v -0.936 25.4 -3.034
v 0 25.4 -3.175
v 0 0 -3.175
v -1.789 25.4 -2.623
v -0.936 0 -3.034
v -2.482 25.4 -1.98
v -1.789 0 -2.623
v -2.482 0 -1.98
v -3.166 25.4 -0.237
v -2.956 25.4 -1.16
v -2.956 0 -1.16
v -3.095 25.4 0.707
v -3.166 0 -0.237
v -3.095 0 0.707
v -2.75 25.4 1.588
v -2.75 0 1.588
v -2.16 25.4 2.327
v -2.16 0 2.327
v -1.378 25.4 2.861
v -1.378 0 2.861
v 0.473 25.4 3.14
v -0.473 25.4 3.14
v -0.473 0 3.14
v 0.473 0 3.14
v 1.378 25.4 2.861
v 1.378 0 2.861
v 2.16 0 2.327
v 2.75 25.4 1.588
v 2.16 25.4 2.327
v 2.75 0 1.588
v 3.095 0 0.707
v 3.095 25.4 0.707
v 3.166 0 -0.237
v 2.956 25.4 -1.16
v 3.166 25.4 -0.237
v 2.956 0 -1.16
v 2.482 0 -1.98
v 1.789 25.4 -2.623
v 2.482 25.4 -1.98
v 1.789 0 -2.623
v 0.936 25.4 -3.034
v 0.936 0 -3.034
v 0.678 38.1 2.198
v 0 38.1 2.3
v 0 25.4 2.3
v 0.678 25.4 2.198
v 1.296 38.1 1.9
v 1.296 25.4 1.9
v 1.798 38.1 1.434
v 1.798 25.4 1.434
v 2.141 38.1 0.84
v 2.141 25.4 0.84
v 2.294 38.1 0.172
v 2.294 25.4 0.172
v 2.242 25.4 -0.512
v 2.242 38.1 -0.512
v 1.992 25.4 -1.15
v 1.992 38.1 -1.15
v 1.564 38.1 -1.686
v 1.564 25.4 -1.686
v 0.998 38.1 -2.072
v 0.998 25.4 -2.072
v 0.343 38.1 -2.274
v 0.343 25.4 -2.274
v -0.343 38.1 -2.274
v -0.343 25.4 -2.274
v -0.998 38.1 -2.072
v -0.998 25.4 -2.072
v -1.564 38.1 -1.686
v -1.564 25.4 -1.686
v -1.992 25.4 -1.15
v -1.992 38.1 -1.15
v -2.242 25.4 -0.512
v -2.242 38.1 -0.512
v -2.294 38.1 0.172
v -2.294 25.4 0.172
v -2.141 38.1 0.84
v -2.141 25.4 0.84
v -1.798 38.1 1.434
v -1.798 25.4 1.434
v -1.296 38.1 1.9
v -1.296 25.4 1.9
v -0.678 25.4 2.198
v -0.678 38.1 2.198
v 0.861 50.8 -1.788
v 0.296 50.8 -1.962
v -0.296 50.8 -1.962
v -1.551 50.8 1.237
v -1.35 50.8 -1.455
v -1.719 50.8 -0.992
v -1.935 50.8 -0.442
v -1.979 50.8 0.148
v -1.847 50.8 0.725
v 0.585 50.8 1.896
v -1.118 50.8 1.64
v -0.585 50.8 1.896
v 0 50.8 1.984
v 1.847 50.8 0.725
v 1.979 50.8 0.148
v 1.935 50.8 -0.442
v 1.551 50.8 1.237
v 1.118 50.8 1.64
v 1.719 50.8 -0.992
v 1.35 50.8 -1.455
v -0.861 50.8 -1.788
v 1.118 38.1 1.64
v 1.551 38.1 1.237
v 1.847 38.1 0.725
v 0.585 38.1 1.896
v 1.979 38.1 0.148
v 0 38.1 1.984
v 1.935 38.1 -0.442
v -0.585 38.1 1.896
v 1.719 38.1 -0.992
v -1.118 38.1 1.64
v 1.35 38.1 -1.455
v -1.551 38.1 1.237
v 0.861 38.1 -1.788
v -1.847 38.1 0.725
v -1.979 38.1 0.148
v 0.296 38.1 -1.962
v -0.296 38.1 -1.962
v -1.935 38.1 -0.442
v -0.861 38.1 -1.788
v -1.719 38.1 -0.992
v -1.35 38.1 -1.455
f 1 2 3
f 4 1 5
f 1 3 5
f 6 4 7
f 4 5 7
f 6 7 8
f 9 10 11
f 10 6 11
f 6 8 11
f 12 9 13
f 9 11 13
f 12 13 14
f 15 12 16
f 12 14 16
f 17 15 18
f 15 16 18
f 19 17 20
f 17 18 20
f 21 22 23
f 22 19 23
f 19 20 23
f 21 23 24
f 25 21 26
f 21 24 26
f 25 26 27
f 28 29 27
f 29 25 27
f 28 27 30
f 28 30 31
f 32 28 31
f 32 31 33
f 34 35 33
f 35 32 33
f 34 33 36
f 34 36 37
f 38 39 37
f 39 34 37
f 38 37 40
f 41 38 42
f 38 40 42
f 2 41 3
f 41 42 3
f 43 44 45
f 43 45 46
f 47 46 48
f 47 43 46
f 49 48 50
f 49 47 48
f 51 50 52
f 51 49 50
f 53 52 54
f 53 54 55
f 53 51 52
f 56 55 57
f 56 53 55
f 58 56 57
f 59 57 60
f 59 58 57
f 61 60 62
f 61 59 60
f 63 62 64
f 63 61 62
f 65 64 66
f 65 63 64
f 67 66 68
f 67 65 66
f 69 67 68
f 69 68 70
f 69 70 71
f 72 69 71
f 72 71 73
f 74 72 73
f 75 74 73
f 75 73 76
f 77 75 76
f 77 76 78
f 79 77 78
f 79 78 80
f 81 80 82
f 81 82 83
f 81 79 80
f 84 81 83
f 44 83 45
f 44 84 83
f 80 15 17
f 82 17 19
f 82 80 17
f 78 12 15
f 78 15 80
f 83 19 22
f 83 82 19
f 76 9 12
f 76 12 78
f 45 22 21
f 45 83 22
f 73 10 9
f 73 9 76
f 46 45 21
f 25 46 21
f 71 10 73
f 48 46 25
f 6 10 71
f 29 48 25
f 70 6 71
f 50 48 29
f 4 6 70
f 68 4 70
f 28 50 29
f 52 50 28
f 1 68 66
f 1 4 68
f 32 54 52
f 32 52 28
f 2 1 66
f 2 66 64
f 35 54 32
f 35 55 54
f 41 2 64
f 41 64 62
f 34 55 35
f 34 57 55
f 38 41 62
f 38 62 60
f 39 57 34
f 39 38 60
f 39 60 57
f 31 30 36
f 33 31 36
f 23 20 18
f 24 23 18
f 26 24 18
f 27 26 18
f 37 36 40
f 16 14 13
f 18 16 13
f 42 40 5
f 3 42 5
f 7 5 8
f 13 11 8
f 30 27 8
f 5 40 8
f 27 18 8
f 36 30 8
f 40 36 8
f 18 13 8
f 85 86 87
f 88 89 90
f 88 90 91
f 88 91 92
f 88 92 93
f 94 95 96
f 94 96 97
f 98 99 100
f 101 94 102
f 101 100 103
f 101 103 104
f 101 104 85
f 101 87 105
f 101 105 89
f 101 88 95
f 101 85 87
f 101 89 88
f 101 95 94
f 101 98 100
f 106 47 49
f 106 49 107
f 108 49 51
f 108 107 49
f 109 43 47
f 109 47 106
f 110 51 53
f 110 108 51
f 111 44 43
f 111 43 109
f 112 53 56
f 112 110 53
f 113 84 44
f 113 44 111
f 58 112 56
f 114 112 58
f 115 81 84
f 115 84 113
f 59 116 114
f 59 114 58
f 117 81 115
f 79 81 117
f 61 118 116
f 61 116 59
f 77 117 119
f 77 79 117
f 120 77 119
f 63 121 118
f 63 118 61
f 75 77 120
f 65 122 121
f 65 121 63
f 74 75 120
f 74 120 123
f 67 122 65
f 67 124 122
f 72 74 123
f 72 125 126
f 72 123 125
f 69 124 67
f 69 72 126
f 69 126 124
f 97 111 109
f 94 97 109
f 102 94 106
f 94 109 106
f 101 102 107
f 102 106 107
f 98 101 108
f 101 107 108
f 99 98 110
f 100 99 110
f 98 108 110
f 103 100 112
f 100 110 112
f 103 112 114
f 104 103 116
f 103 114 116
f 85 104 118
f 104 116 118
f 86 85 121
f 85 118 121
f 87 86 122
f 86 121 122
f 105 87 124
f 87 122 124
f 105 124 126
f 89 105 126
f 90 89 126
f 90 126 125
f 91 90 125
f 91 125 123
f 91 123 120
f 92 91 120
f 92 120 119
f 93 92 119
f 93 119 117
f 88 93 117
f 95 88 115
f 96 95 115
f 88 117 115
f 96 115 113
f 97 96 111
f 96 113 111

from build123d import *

# Parameters (mm, degrees)
SKETCH1_R           = 3.175
BOSS_EXTRUDE1_DEPTH = 38.1
SKETCH2_R           = 3.591307694
SKETCH2_R_2         = 2.3
CUT_EXTRUDE1_DEPTH  = 12.7
SKETCH3_R           = 1.984375
BOSS_EXTRUDE2_DEPTH = 12.7


with BuildPart() as part:
    # Sketch1 → Boss-Extrude1 (new body)
    with BuildSketch(Plane(origin=(0, 0, 0), x_dir=(1, 0, 0), z_dir=(0, 1, 0))):
        with Locations(Location((0, 0, 0), (0, 0, 90))):
            Circle(SKETCH1_R)
    extrude(amount=BOSS_EXTRUDE1_DEPTH)

    # Sketch2 → Cut-Extrude1 (cut)
    with BuildSketch(Plane(origin=(0, 38.1, 0), x_dir=(1, 0, 0), z_dir=(0, 1, 0))):
        Circle(SKETCH2_R)
        with Locations(Location((0, 0, 0), (0, 0, 270))):
            Circle(SKETCH2_R_2, mode=Mode.SUBTRACT)
    extrude(amount=-CUT_EXTRUDE1_DEPTH, mode=Mode.SUBTRACT)

    # Sketch3 → Boss-Extrude2 (add)
    with BuildSketch(Plane(origin=(0, 38.1, 0), x_dir=(1, 0, 0), z_dir=(0, 1, 0))):
        with Locations(Location((0, 0, 0), (0, 0, 270))):
            Circle(SKETCH3_R)
    extrude(amount=BOSS_EXTRUDE2_DEPTH)


solid = part.part
